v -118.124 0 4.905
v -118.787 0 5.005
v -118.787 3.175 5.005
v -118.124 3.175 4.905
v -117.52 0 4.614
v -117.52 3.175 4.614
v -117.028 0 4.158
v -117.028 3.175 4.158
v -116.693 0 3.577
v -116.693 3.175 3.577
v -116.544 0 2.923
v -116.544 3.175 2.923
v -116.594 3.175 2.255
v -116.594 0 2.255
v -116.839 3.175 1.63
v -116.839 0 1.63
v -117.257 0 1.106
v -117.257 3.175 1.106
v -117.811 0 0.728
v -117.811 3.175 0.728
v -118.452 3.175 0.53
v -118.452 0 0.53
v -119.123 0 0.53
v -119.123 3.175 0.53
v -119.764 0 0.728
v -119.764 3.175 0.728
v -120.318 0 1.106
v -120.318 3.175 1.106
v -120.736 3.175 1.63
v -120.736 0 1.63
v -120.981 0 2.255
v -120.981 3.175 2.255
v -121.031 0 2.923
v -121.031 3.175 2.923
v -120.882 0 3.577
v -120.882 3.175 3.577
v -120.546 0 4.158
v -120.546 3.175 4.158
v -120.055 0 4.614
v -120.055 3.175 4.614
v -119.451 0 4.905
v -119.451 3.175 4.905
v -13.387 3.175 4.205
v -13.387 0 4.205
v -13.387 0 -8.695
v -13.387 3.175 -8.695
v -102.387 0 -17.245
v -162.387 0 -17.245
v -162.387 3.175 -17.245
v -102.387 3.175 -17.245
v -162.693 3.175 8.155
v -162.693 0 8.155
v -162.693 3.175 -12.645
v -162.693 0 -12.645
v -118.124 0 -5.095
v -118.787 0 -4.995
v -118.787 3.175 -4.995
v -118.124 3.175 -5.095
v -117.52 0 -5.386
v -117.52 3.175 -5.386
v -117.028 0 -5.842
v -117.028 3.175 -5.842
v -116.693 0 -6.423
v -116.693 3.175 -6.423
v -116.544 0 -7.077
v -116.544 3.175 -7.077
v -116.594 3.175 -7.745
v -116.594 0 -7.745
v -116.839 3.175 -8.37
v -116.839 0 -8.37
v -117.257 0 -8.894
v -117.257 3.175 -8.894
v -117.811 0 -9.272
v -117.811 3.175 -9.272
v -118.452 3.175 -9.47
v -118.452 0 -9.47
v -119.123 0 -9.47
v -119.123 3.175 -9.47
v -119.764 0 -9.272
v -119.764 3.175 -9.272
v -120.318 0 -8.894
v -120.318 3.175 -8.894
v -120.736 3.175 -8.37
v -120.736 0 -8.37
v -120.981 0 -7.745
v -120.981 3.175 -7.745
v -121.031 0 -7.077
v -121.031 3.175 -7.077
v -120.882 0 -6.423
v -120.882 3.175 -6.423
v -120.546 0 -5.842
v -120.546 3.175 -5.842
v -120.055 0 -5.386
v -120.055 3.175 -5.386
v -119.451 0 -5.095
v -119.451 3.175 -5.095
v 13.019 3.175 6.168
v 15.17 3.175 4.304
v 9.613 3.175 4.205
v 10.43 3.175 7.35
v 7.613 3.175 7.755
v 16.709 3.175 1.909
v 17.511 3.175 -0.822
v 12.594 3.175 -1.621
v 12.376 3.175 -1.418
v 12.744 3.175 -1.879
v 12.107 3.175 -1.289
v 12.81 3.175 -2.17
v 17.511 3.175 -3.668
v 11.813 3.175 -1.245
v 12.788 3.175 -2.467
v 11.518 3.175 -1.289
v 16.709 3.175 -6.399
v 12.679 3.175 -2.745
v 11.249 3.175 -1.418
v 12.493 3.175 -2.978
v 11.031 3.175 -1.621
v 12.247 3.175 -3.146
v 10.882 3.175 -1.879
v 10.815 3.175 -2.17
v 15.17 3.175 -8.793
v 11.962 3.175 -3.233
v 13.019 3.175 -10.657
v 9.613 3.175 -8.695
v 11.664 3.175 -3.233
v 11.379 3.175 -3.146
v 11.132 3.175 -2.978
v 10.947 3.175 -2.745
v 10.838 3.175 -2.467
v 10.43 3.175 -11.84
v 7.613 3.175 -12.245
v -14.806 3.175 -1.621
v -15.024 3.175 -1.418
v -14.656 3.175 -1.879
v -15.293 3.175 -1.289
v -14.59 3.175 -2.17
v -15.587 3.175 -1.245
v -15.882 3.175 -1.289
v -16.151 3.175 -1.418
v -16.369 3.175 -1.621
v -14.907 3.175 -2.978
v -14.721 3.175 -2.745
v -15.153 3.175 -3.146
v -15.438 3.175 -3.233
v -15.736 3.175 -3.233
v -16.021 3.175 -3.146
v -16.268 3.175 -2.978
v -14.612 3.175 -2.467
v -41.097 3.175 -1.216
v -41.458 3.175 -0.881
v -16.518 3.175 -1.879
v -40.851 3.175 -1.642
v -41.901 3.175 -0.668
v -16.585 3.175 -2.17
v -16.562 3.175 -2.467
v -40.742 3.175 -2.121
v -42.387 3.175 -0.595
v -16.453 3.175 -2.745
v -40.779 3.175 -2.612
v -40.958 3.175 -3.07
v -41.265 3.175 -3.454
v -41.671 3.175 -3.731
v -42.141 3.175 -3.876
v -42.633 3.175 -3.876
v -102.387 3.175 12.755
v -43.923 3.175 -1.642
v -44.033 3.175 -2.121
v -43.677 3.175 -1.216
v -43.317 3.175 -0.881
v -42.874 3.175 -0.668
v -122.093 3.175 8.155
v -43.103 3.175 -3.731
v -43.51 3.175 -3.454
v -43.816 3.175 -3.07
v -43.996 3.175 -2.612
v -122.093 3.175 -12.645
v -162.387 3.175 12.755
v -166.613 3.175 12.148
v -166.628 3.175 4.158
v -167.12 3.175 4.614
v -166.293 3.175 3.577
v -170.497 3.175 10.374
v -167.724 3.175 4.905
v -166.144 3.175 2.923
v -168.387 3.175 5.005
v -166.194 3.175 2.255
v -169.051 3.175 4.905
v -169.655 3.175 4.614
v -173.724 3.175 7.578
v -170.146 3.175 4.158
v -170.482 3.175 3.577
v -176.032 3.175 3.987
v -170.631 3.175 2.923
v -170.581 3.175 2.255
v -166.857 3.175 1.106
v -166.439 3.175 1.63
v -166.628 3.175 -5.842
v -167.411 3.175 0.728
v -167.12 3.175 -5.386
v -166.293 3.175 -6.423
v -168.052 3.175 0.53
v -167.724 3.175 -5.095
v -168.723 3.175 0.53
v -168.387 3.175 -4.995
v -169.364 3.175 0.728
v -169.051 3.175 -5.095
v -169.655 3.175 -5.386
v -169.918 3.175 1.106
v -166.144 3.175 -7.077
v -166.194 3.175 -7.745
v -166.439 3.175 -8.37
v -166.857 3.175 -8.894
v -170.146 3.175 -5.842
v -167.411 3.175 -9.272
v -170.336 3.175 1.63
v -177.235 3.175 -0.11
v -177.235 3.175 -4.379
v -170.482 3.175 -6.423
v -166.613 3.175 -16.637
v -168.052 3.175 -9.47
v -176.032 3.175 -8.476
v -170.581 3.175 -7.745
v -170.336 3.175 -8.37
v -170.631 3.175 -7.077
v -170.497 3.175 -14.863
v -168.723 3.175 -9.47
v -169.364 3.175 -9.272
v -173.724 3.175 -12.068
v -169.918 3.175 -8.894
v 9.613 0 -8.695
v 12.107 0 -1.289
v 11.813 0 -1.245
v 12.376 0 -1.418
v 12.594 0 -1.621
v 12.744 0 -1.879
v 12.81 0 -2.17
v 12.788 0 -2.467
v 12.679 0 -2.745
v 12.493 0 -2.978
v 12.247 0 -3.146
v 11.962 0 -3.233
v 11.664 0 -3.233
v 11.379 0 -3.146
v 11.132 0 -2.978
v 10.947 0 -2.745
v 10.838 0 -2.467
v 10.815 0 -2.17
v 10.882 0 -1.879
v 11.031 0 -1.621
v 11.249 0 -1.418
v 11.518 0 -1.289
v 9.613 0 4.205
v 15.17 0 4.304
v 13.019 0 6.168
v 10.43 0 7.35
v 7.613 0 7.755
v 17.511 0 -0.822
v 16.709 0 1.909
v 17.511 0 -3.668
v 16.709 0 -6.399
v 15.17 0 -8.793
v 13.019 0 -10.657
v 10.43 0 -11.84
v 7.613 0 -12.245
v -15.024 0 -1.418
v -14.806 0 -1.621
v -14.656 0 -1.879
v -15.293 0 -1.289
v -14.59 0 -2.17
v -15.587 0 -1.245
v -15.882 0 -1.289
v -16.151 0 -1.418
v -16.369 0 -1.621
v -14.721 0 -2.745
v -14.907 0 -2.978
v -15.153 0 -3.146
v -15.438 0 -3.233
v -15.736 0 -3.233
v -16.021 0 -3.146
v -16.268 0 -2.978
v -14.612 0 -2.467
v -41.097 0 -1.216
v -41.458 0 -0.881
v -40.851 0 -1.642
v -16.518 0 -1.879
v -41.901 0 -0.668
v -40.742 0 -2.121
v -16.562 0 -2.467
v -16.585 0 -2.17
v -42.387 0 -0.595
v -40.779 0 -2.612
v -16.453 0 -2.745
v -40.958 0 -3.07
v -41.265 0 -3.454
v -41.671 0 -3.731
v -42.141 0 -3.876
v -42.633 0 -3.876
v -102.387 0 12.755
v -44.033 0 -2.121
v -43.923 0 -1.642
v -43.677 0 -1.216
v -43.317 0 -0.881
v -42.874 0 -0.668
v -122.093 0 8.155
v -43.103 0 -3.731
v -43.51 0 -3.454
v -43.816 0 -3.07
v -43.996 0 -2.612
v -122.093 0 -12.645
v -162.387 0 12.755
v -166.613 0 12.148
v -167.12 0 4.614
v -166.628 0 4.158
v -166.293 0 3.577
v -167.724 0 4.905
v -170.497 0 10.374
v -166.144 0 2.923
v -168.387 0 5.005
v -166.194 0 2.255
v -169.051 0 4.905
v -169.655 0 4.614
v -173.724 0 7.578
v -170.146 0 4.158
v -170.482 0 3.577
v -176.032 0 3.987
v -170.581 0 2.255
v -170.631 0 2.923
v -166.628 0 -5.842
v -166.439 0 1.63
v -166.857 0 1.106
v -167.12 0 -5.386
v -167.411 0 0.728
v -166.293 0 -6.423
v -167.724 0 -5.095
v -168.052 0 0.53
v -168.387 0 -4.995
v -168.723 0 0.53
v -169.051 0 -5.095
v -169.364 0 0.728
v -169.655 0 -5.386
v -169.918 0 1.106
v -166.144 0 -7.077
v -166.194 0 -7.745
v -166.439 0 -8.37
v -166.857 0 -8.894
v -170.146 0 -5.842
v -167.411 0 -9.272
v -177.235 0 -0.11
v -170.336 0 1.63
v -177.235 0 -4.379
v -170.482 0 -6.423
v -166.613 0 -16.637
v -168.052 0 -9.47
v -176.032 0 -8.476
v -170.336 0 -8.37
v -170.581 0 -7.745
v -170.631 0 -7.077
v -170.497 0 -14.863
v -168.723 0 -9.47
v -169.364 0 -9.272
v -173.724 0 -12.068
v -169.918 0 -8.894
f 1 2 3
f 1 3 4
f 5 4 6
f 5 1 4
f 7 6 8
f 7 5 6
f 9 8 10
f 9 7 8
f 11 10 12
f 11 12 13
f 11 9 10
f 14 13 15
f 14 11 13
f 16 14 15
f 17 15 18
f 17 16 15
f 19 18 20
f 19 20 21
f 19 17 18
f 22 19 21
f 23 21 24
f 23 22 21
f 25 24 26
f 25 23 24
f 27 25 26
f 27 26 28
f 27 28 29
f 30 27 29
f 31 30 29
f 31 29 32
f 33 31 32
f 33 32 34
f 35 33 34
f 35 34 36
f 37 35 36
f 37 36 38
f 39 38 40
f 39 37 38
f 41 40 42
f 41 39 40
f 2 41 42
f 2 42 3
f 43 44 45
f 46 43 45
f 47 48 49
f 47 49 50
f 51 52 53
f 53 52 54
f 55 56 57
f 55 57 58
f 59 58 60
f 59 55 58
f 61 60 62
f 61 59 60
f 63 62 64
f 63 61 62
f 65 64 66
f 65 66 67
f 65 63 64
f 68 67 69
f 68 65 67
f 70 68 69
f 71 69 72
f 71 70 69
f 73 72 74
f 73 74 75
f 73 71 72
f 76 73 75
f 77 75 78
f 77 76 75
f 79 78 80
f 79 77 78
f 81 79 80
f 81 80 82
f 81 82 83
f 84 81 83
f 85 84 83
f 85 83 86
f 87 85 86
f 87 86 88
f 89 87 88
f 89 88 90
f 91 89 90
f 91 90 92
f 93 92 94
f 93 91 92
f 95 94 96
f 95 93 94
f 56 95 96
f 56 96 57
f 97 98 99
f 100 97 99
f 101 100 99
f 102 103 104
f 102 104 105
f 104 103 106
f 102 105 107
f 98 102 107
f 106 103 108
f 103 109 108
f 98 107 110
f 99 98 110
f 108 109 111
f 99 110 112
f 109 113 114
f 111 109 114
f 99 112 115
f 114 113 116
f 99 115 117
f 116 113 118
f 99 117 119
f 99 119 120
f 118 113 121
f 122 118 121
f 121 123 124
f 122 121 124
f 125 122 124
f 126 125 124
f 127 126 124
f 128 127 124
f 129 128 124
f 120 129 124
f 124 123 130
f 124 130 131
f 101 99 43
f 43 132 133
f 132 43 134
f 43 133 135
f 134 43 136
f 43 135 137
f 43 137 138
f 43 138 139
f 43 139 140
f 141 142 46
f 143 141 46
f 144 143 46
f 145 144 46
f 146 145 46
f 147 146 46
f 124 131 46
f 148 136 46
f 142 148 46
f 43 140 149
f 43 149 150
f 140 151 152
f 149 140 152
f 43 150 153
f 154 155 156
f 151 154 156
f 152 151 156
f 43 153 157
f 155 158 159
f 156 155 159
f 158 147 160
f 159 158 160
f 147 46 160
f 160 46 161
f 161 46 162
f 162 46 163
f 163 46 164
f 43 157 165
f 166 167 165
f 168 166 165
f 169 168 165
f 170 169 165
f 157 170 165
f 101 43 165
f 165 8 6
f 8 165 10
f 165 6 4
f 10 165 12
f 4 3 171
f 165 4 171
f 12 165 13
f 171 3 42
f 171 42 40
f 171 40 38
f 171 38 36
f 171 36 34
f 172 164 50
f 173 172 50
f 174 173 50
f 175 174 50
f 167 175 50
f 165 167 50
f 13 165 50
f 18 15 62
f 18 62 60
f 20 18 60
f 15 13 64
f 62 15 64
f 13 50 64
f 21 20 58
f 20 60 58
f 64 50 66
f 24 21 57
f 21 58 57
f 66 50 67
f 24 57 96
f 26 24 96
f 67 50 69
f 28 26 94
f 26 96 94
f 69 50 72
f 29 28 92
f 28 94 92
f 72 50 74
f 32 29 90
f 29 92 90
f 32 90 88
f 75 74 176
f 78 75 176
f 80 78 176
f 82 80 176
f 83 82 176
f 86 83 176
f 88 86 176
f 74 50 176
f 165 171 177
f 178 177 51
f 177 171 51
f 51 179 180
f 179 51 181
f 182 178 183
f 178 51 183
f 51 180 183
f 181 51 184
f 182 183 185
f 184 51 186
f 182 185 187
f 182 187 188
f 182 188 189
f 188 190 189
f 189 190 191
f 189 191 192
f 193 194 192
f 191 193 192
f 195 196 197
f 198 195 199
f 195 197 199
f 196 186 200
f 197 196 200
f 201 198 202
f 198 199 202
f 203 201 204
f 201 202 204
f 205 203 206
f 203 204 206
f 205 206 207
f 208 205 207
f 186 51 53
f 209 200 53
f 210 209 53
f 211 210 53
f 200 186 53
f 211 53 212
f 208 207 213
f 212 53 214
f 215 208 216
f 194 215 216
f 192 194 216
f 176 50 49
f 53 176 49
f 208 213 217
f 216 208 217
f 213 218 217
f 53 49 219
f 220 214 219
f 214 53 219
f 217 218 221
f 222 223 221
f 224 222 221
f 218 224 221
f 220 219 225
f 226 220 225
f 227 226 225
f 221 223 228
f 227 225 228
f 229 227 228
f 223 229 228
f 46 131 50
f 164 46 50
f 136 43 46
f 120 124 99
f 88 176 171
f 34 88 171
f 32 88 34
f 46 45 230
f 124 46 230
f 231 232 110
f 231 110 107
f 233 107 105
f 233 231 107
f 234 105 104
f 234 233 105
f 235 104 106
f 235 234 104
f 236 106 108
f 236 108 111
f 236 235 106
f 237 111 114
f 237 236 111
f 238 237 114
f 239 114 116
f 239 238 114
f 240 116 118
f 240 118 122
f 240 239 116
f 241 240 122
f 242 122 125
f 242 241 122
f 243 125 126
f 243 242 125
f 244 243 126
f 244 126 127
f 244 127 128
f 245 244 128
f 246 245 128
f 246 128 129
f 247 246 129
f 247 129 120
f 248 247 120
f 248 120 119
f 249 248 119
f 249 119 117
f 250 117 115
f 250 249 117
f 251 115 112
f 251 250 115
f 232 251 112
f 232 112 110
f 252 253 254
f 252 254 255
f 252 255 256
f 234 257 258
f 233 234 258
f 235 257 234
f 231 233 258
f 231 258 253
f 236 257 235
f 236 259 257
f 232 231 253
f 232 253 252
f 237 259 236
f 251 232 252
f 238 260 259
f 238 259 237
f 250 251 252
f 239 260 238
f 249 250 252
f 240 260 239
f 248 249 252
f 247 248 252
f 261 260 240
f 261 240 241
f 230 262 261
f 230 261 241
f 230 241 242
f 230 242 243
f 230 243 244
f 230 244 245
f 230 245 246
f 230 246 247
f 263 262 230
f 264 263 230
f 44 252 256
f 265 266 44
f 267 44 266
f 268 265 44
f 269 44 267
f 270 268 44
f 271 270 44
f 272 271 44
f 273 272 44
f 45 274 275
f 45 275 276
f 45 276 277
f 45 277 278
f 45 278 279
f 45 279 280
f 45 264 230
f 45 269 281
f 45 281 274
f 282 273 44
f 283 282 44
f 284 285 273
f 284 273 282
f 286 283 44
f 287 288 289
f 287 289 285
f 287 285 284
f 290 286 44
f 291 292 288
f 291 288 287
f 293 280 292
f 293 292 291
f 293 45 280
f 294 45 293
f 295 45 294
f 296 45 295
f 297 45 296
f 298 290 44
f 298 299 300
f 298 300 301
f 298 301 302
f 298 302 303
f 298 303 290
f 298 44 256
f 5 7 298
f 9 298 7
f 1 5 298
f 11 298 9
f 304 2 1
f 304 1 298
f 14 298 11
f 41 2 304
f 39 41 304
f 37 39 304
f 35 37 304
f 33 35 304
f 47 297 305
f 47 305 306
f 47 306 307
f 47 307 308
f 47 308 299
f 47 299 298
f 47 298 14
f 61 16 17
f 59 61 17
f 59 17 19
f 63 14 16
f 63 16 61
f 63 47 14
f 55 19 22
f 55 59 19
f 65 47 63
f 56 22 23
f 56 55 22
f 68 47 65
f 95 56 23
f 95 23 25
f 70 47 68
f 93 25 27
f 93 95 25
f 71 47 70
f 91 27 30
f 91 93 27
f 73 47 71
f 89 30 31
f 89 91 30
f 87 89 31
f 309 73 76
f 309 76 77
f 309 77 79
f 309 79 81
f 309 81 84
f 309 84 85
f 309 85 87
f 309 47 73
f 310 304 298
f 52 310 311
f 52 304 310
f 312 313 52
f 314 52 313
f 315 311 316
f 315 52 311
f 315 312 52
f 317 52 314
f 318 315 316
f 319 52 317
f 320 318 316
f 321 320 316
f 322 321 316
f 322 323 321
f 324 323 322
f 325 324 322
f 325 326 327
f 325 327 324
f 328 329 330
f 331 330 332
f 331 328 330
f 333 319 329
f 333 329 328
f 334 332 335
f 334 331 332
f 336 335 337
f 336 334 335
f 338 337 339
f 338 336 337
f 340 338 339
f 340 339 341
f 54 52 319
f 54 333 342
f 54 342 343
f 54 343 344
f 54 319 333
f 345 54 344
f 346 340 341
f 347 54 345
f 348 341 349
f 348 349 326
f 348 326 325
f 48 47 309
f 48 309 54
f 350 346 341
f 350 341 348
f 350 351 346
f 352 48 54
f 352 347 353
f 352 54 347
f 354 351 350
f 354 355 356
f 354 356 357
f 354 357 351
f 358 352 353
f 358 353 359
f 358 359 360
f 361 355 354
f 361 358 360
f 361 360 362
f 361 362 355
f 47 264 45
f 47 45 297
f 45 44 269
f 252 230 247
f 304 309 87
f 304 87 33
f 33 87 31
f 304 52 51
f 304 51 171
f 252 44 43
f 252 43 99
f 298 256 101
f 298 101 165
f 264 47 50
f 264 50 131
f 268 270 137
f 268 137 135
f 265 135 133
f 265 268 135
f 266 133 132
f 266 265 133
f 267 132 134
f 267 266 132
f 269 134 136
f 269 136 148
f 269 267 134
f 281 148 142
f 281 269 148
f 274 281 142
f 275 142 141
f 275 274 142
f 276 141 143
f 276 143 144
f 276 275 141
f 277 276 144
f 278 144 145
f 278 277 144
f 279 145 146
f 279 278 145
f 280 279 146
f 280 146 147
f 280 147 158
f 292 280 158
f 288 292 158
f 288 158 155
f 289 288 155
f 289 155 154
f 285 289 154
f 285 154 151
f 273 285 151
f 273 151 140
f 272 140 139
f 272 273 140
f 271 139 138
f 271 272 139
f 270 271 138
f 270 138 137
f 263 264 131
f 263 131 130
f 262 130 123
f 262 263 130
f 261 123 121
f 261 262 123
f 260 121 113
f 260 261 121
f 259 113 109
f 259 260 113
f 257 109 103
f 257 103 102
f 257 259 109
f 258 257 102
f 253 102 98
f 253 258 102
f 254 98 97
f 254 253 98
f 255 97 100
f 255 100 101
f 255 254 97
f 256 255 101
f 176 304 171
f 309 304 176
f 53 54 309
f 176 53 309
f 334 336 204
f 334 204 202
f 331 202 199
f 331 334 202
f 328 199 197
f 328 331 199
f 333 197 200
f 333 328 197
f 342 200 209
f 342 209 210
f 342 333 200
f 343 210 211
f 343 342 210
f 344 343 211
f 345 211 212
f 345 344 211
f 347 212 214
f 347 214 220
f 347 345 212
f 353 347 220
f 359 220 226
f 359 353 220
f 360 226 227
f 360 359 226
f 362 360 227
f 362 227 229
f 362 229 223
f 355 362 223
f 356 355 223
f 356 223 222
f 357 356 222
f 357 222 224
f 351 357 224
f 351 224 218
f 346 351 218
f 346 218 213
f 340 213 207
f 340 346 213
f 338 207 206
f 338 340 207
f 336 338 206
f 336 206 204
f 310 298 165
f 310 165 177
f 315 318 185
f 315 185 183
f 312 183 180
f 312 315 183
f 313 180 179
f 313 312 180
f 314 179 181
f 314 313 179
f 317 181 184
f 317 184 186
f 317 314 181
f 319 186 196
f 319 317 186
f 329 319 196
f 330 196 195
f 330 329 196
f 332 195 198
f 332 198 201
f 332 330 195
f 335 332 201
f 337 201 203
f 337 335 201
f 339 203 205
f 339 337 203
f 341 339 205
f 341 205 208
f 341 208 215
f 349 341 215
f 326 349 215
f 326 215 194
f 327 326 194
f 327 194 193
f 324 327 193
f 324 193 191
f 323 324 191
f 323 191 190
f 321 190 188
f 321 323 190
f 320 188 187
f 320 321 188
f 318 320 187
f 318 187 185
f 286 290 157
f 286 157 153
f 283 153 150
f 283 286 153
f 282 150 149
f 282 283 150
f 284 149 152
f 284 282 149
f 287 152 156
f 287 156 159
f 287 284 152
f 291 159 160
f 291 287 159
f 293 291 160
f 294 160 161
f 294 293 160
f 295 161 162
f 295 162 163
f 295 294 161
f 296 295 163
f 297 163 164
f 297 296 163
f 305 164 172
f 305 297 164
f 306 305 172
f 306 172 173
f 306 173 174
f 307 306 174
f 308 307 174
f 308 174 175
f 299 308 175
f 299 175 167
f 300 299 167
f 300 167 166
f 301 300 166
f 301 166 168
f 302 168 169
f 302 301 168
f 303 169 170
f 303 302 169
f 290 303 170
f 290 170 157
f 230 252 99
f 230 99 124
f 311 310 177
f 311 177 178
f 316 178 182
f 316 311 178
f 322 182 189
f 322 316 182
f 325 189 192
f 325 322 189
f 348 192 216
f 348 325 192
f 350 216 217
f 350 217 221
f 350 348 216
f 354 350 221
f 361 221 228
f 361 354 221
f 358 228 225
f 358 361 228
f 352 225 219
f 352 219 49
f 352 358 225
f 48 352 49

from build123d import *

# Parameters (mm, degrees)
SKETCH1_R           = 2.25
SKETCH1_R_2         = 1
SKETCH1_R_3         = 1.65
SKETCH1_W           = 40.6
SKETCH1_H           = 20.8
SKETCH1_W_2         = 23
SKETCH1_H_2         = 12.9
BOSS_EXTRUDE1_DEPTH = 3.175


with BuildPart() as part:
    # Sketch1 → Boss-Extrude1 (new body)
    with BuildSketch(Plane(origin=(0, 0, 0), x_dir=(1, 0, 0), z_dir=(0, 1, 0))):
        with BuildLine():
            Line((-162.38735588, 17.244652891), (-102.38735588, 17.244652891))
            Line((-102.38735588, 17.244652891), (7.61264412, 12.244652891))
            ThreePointArc((7.61264412, 12.244652891), (17.61264412, 2.244652891), (7.61264412, -7.755347109))
            Line((7.61264412, -7.755347109), (-102.38735588, -12.755347109))
            Line((-102.38735588, -12.755347109), (-162.38735588, -12.755347109))
            ThreePointArc((-162.38735588, -12.755347109), (-177.38735588, 2.244652891), (-162.38735588, 17.244652891))
        make_face()
        with Locations(Location((-168.38735588, 7.244652891, 0), (0, 0, 270))):
            Circle(SKETCH1_R, mode=Mode.SUBTRACT)
        with Locations(Location((-168.38735588, -2.755347109, 0), (0, 0, 270))):
            Circle(SKETCH1_R, mode=Mode.SUBTRACT)
        with Locations(Location((-118.78735588, 7.244652891, 0), (0, 0, 270))):
            Circle(SKETCH1_R, mode=Mode.SUBTRACT)
        with Locations(Location((-118.78735588, -2.755347109, 0), (0, 0, 270))):
            Circle(SKETCH1_R, mode=Mode.SUBTRACT)
        with Locations(Location((-15.58735588, 2.244652891, 0), (0, 0, 270))):
            Circle(SKETCH1_R_2, mode=Mode.SUBTRACT)
        with Locations(Location((11.81264412, 2.244652891, 0), (0, 0, 270))):
            Circle(SKETCH1_R_2, mode=Mode.SUBTRACT)
        with Locations(Location((-42.38735588, 2.244652891, 0), (0, 0, 270))):
            Circle(SKETCH1_R_3, mode=Mode.SUBTRACT)
        with Locations((-142.392621679, 2.244652891)):
            Rectangle(SKETCH1_W, SKETCH1_H, mode=Mode.SUBTRACT)
        with Locations((-1.88735588, 2.244652891)):
            Rectangle(SKETCH1_W_2, SKETCH1_H_2, mode=Mode.SUBTRACT)
    extrude(amount=BOSS_EXTRUDE1_DEPTH)


solid = part.part
